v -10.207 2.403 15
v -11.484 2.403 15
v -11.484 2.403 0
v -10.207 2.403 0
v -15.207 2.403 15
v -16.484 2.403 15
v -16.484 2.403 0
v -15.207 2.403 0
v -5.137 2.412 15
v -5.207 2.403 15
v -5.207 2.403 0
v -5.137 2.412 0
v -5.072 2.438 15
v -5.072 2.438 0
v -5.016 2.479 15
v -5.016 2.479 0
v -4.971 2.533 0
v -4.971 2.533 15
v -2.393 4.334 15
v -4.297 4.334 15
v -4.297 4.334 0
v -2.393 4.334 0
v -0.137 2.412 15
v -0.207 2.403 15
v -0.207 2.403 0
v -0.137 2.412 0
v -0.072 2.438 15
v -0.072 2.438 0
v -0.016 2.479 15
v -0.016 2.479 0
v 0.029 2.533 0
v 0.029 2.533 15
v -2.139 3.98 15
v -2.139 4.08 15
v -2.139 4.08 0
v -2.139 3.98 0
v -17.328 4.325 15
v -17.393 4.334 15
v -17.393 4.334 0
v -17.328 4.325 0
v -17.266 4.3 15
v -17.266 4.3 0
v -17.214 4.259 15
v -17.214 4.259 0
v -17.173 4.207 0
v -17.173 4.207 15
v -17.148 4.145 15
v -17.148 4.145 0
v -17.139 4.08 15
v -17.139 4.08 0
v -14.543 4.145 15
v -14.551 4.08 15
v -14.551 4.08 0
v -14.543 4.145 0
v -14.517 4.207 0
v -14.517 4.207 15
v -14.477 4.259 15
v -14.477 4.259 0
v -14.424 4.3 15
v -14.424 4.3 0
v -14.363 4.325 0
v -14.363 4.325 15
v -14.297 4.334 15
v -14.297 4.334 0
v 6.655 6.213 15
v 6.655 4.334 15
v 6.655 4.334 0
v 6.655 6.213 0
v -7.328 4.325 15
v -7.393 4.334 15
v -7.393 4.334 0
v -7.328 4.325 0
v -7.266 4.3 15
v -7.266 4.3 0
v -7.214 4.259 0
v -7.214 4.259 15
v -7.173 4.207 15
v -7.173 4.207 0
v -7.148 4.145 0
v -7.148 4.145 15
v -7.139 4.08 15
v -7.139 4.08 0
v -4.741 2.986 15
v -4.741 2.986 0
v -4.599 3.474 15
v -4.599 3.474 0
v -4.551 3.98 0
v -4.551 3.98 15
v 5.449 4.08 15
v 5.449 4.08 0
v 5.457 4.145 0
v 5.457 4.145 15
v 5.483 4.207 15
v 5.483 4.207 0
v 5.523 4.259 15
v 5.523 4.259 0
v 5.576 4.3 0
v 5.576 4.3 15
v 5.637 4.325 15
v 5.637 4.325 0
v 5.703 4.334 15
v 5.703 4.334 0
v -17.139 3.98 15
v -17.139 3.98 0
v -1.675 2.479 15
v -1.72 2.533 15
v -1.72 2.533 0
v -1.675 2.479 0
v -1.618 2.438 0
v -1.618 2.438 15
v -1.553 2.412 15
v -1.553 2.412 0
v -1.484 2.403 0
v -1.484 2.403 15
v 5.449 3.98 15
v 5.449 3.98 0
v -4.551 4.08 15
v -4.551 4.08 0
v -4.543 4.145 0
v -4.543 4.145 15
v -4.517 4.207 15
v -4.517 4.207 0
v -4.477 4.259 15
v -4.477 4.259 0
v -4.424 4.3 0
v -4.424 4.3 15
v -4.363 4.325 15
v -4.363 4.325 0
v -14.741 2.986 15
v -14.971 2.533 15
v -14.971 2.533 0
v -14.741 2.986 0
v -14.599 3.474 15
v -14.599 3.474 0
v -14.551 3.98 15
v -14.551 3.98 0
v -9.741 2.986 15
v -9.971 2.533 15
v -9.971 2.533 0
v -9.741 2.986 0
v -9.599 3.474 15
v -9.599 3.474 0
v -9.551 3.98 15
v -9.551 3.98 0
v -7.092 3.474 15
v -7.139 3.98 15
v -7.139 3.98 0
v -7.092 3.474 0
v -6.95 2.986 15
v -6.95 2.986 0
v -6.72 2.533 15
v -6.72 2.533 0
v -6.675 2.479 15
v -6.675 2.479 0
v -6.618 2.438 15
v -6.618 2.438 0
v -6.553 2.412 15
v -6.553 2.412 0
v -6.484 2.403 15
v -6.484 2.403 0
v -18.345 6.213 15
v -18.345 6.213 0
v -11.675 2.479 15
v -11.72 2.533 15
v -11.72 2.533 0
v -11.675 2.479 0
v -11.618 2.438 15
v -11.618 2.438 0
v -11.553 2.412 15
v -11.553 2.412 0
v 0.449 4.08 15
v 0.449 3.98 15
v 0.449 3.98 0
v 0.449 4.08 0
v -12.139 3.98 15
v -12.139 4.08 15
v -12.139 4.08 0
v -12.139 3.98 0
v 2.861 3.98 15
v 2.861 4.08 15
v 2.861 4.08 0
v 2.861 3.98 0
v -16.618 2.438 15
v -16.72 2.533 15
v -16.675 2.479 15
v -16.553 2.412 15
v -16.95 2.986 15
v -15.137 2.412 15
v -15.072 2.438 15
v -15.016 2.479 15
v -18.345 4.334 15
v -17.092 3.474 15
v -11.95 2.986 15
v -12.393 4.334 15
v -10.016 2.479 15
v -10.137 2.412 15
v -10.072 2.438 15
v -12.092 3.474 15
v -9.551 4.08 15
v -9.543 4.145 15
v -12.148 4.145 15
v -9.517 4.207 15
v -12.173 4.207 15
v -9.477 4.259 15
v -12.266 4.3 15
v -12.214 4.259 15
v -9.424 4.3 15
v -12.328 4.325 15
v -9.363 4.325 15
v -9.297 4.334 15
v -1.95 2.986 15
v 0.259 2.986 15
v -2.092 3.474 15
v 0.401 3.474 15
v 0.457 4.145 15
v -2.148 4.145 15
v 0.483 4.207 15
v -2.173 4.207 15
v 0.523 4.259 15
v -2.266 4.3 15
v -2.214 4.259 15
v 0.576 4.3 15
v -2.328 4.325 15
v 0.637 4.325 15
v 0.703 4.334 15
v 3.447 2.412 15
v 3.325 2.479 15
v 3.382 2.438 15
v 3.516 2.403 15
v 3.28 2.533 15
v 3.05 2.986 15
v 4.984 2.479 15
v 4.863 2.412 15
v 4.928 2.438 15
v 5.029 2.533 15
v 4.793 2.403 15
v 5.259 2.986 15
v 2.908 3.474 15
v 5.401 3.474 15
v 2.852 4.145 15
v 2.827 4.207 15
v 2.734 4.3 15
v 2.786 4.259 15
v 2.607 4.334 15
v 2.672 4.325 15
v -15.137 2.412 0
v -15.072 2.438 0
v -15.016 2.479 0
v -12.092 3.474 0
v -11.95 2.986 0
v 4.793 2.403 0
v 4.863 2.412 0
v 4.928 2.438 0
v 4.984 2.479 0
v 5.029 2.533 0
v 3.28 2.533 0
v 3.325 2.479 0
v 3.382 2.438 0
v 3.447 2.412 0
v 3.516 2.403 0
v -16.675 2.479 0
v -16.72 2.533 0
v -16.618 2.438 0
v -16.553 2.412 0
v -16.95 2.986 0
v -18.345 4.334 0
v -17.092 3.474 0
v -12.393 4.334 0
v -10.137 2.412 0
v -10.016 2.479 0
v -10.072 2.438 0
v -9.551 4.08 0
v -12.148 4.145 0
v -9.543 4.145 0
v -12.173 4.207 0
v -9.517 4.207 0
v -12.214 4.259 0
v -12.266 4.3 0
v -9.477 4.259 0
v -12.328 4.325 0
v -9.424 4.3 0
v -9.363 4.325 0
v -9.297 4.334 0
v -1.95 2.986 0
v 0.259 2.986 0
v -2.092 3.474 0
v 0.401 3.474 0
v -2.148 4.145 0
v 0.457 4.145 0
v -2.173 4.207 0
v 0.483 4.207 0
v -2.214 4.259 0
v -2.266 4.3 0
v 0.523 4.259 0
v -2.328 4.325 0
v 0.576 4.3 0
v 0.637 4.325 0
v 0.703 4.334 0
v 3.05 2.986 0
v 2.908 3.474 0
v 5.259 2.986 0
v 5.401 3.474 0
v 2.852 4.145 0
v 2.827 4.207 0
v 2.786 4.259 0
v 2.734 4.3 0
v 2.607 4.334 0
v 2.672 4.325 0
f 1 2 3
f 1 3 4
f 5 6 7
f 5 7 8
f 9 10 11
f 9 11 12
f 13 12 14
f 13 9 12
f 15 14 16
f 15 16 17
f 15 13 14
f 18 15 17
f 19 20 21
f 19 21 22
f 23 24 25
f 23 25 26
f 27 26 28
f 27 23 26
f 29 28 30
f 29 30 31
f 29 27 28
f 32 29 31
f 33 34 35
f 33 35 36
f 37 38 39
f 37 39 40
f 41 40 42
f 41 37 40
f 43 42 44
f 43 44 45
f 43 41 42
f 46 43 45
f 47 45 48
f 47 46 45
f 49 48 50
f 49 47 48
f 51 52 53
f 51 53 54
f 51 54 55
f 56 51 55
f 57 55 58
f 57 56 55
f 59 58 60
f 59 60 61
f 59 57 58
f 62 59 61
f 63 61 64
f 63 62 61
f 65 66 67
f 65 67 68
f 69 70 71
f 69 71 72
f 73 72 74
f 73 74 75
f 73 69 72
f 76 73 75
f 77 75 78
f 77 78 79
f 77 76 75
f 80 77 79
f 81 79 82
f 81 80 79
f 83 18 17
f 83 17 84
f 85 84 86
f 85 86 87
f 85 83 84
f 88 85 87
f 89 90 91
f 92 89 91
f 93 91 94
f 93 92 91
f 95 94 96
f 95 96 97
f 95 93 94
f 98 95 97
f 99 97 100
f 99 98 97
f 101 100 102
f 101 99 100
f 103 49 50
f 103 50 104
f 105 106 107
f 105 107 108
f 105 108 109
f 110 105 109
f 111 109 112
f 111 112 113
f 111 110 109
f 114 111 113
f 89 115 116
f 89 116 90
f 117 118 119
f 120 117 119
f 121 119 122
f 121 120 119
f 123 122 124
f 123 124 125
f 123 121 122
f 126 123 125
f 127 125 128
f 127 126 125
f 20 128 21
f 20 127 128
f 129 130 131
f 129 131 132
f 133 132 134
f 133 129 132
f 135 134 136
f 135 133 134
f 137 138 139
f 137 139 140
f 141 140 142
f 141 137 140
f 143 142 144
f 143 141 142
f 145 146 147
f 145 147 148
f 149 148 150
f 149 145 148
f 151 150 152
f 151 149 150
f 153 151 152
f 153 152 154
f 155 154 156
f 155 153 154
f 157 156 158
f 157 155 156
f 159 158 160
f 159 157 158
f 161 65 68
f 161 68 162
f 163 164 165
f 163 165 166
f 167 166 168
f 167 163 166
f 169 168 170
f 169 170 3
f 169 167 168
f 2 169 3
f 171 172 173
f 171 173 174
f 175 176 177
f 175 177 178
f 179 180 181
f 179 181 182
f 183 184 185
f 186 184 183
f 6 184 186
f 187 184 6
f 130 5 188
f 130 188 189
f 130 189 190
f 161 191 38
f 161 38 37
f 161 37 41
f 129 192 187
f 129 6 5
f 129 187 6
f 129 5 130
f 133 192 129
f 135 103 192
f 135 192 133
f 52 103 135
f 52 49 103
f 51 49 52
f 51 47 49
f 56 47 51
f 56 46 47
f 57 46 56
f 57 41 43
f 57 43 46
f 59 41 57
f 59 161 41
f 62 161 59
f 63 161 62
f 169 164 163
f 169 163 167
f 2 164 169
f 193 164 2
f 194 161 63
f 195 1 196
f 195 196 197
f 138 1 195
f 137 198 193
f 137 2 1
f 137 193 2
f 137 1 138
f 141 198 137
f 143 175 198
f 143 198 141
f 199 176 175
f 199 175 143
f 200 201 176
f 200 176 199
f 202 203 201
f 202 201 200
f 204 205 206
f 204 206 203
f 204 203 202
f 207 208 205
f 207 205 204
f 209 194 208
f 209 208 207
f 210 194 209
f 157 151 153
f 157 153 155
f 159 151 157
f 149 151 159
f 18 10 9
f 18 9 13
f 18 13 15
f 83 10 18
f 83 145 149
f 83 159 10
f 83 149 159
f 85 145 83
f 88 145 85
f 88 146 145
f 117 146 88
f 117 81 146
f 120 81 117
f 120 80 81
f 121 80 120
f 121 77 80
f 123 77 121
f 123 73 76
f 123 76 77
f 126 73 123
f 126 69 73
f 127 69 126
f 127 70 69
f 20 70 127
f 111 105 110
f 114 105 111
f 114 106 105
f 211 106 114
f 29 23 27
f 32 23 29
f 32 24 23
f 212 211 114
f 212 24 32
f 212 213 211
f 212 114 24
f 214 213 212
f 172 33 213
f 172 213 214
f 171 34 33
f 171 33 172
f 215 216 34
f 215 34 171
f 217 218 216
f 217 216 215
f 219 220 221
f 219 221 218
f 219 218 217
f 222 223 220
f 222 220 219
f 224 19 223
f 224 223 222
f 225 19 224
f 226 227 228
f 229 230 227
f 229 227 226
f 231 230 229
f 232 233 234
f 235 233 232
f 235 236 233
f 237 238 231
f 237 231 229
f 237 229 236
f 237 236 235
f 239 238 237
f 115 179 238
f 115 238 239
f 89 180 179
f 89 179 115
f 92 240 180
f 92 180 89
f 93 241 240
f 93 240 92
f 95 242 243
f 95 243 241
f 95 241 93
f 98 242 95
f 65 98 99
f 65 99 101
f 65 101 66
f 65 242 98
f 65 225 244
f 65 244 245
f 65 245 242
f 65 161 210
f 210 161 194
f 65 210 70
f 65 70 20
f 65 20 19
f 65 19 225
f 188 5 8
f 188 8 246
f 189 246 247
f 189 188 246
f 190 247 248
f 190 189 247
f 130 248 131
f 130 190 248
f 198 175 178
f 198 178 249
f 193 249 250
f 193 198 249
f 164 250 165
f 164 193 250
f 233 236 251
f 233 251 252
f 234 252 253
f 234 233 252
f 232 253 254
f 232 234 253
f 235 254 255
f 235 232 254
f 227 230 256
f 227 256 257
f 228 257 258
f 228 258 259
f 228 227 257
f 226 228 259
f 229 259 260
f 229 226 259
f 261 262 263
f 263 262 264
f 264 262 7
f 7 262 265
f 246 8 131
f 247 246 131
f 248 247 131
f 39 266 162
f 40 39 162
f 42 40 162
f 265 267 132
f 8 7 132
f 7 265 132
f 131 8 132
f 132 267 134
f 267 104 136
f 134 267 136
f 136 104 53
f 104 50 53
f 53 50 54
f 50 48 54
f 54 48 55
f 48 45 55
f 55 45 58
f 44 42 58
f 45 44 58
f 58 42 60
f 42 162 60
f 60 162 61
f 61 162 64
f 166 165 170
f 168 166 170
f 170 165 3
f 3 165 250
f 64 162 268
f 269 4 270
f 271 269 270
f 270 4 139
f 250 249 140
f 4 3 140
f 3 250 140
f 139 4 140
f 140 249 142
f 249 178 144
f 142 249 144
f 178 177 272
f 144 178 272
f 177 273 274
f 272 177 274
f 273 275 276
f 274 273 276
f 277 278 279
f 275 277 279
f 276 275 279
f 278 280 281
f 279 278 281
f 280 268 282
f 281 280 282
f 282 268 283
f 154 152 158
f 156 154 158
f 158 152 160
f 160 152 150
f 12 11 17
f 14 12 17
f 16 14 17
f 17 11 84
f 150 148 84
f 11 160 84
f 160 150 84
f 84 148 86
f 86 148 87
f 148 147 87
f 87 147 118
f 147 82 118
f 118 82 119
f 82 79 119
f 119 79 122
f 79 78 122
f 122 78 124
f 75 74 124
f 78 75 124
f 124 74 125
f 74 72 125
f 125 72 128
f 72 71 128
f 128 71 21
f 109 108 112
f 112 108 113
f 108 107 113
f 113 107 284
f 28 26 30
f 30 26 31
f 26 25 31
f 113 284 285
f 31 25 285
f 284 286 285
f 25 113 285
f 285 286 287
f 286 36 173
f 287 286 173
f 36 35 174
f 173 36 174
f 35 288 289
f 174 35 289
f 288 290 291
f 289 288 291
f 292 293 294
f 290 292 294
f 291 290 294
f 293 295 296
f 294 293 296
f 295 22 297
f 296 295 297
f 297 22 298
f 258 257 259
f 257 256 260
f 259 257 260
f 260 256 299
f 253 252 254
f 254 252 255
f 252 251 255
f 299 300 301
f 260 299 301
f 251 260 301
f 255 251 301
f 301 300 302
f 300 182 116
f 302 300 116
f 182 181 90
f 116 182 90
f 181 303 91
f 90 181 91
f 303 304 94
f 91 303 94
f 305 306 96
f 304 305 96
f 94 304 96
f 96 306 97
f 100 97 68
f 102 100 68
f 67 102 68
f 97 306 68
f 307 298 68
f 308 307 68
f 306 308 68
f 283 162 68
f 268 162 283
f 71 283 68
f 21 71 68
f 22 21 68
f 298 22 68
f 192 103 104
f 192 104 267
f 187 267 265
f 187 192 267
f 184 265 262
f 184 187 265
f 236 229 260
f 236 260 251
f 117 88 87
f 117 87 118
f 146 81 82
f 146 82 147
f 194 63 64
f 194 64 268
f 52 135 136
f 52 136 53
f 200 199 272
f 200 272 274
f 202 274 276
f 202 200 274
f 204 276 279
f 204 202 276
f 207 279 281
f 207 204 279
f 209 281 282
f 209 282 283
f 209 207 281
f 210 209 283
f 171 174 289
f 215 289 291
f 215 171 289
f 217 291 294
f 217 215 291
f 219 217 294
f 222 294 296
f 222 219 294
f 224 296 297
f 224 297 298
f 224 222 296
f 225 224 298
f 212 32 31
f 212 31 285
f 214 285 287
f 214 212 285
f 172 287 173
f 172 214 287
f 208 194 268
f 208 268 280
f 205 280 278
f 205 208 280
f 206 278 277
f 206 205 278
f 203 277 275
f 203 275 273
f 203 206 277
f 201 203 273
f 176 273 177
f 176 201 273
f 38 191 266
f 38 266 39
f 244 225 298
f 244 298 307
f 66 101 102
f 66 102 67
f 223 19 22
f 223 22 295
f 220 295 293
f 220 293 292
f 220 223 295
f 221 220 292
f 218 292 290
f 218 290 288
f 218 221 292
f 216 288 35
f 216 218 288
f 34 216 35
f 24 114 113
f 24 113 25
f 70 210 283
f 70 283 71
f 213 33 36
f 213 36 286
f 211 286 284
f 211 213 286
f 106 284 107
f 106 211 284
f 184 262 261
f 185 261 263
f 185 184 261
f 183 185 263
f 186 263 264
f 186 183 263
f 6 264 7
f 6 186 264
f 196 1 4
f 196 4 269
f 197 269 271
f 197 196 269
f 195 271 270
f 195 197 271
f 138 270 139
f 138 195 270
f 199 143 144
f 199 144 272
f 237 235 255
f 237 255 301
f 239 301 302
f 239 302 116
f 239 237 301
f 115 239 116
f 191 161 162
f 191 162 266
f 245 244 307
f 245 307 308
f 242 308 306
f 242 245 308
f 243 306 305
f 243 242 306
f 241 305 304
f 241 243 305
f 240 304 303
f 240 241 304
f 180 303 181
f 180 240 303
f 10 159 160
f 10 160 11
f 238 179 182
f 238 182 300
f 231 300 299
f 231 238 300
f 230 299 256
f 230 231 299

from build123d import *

# Parameters (mm, degrees)
EXTRUDE1_DEPTH = 15


with BuildPart() as part:
    # Sketch1 → Extrude1 (new body)
    with BuildSketch(Plane.XY.offset(15)):
        with BuildLine():
            Line((-14.551292676, 3.97958199), (-14.551292676, 4.079606381))
            ThreePointArc((-14.551292676, 4.079606381), (-14.476897799, 4.259211503), (-14.297292676, 4.333606381))
            Line((-14.297292676, 4.333606381), (-12.393373616, 4.333606381))
            ThreePointArc((-12.393373616, 4.333606381), (-12.213768494, 4.259211503), (-12.139373616, 4.079606381))
            Line((-12.139373616, 4.079606381), (-12.139373616, 3.97958199))
            ThreePointArc((-12.139373616, 3.97958199), (-12.032339909, 3.226505542), (-11.719716097, 2.533074433))
            ThreePointArc((-11.719716097, 2.533074433), (-11.618392315, 2.437817098), (-11.483697969, 2.403206381))
            Line((-11.483697969, 2.403206381), (-10.206978323, 2.403206381))
            ThreePointArc((-10.206978323, 2.403206381), (-10.072283977, 2.437817098), (-9.970960196, 2.533074433))
            ThreePointArc((-9.970960196, 2.533074433), (-9.658336383, 3.226505542), (-9.551302676, 3.97958199))
            Line((-9.551302676, 3.97958199), (-9.551302676, 4.079606381))
            ThreePointArc((-9.551302676, 4.079606381), (-9.476907799, 4.259211503), (-9.297302676, 4.333606381))
            Line((-9.297302676, 4.333606381), (-7.393383616, 4.333606381))
            ThreePointArc((-7.393383616, 4.333606381), (-7.213778494, 4.259211503), (-7.139383616, 4.079606381))
            Line((-7.139383616, 4.079606381), (-7.139383616, 3.97958199))
            ThreePointArc((-7.139383616, 3.97958199), (-7.032349909, 3.226505542), (-6.719726097, 2.533074433))
            ThreePointArc((-6.719726097, 2.533074433), (-6.618402315, 2.437817098), (-6.483707969, 2.403206381))
            Line((-6.483707969, 2.403206381), (-5.206988323, 2.403206381))
            ThreePointArc((-5.206988323, 2.403206381), (-5.072293977, 2.437817098), (-4.970970196, 2.533074433))
            ThreePointArc((-4.970970196, 2.533074433), (-4.658346383, 3.226505542), (-4.551312676, 3.97958199))
            Line((-4.551312676, 3.97958199), (-4.551312676, 4.079606381))
            ThreePointArc((-4.551312676, 4.079606381), (-4.476917799, 4.259211503), (-4.297312676, 4.333606381))
            Line((-4.297312676, 4.333606381), (-2.393393616, 4.333606381))
            ThreePointArc((-2.393393616, 4.333606381), (-2.213788494, 4.259211503), (-2.139393616, 4.079606381))
            Line((-2.139393616, 4.079606381), (-2.139393616, 3.97958199))
            ThreePointArc((-2.139393616, 3.97958199), (-2.032359909, 3.226505542), (-1.719736097, 2.533074433))
            ThreePointArc((-1.719736097, 2.533074433), (-1.618412315, 2.437817098), (-1.483717969, 2.403206381))
            Line((-1.483717969, 2.403206381), (-0.206998323, 2.403206381))
            ThreePointArc((-0.206998323, 2.403206381), (-0.072303977, 2.437817098), (0.029019804, 2.533074433))
            ThreePointArc((0.029019804, 2.533074433), (0.341643617, 3.226505542), (0.448677324, 3.97958199))
            Line((0.448677324, 3.97958199), (0.448677324, 4.079606381))
            ThreePointArc((0.448677324, 4.079606381), (0.523072201, 4.259211503), (0.702677324, 4.333606381))
            Line((0.702677324, 4.333606381), (2.606596384, 4.333606381))
            ThreePointArc((2.606596384, 4.333606381), (2.786201506, 4.259211503), (2.860596384, 4.079606381))
            Line((2.860596384, 4.079606381), (2.860596384, 3.97958199))
            ThreePointArc((2.860596384, 3.97958199), (2.967630091, 3.226505542), (3.280253903, 2.533074433))
            ThreePointArc((3.280253903, 2.533074433), (3.381577685, 2.437817098), (3.516272031, 2.403206381))
            Line((3.516272031, 2.403206381), (4.792991677, 2.403206381))
            ThreePointArc((4.792991677, 2.403206381), (4.927686023, 2.437817098), (5.029009804, 2.533074433))
            ThreePointArc((5.029009804, 2.533074433), (5.341633617, 3.226505542), (5.448667324, 3.97958199))
            Line((5.448667324, 3.97958199), (5.448667324, 4.079606381))
            ThreePointArc((5.448667324, 4.079606381), (5.523062201, 4.259211503), (5.702667324, 4.333606381))
            Line((5.702667324, 4.333606381), (6.654626854, 4.333606381))
            Line((6.654626854, 4.333606381), (6.654626854, 6.213206381))
            Line((6.654626854, 6.213206381), (-18.345323146, 6.213206381))
            Line((-18.345323146, 6.213206381), (-18.345323146, 4.333606381))
            Line((-18.345323146, 4.333606381), (-17.393363616, 4.333606381))
            ThreePointArc((-17.393363616, 4.333606381), (-17.213758494, 4.259211503), (-17.139363616, 4.079606381))
            Line((-17.139363616, 4.079606381), (-17.139363616, 3.97958199))
            ThreePointArc((-17.139363616, 3.97958199), (-17.032329909, 3.226505542), (-16.719706097, 2.533074433))
            ThreePointArc((-16.719706097, 2.533074433), (-16.618382315, 2.437817098), (-16.483687969, 2.403206381))
            Line((-16.483687969, 2.403206381), (-15.206968323, 2.403206381))
            ThreePointArc((-15.206968323, 2.403206381), (-15.072273977, 2.437817098), (-14.970950196, 2.533074433))
            ThreePointArc((-14.970950196, 2.533074433), (-14.658326383, 3.226505542), (-14.551292676, 3.97958199))
        make_face()
    extrude(amount=-EXTRUDE1_DEPTH)


solid = part.part
